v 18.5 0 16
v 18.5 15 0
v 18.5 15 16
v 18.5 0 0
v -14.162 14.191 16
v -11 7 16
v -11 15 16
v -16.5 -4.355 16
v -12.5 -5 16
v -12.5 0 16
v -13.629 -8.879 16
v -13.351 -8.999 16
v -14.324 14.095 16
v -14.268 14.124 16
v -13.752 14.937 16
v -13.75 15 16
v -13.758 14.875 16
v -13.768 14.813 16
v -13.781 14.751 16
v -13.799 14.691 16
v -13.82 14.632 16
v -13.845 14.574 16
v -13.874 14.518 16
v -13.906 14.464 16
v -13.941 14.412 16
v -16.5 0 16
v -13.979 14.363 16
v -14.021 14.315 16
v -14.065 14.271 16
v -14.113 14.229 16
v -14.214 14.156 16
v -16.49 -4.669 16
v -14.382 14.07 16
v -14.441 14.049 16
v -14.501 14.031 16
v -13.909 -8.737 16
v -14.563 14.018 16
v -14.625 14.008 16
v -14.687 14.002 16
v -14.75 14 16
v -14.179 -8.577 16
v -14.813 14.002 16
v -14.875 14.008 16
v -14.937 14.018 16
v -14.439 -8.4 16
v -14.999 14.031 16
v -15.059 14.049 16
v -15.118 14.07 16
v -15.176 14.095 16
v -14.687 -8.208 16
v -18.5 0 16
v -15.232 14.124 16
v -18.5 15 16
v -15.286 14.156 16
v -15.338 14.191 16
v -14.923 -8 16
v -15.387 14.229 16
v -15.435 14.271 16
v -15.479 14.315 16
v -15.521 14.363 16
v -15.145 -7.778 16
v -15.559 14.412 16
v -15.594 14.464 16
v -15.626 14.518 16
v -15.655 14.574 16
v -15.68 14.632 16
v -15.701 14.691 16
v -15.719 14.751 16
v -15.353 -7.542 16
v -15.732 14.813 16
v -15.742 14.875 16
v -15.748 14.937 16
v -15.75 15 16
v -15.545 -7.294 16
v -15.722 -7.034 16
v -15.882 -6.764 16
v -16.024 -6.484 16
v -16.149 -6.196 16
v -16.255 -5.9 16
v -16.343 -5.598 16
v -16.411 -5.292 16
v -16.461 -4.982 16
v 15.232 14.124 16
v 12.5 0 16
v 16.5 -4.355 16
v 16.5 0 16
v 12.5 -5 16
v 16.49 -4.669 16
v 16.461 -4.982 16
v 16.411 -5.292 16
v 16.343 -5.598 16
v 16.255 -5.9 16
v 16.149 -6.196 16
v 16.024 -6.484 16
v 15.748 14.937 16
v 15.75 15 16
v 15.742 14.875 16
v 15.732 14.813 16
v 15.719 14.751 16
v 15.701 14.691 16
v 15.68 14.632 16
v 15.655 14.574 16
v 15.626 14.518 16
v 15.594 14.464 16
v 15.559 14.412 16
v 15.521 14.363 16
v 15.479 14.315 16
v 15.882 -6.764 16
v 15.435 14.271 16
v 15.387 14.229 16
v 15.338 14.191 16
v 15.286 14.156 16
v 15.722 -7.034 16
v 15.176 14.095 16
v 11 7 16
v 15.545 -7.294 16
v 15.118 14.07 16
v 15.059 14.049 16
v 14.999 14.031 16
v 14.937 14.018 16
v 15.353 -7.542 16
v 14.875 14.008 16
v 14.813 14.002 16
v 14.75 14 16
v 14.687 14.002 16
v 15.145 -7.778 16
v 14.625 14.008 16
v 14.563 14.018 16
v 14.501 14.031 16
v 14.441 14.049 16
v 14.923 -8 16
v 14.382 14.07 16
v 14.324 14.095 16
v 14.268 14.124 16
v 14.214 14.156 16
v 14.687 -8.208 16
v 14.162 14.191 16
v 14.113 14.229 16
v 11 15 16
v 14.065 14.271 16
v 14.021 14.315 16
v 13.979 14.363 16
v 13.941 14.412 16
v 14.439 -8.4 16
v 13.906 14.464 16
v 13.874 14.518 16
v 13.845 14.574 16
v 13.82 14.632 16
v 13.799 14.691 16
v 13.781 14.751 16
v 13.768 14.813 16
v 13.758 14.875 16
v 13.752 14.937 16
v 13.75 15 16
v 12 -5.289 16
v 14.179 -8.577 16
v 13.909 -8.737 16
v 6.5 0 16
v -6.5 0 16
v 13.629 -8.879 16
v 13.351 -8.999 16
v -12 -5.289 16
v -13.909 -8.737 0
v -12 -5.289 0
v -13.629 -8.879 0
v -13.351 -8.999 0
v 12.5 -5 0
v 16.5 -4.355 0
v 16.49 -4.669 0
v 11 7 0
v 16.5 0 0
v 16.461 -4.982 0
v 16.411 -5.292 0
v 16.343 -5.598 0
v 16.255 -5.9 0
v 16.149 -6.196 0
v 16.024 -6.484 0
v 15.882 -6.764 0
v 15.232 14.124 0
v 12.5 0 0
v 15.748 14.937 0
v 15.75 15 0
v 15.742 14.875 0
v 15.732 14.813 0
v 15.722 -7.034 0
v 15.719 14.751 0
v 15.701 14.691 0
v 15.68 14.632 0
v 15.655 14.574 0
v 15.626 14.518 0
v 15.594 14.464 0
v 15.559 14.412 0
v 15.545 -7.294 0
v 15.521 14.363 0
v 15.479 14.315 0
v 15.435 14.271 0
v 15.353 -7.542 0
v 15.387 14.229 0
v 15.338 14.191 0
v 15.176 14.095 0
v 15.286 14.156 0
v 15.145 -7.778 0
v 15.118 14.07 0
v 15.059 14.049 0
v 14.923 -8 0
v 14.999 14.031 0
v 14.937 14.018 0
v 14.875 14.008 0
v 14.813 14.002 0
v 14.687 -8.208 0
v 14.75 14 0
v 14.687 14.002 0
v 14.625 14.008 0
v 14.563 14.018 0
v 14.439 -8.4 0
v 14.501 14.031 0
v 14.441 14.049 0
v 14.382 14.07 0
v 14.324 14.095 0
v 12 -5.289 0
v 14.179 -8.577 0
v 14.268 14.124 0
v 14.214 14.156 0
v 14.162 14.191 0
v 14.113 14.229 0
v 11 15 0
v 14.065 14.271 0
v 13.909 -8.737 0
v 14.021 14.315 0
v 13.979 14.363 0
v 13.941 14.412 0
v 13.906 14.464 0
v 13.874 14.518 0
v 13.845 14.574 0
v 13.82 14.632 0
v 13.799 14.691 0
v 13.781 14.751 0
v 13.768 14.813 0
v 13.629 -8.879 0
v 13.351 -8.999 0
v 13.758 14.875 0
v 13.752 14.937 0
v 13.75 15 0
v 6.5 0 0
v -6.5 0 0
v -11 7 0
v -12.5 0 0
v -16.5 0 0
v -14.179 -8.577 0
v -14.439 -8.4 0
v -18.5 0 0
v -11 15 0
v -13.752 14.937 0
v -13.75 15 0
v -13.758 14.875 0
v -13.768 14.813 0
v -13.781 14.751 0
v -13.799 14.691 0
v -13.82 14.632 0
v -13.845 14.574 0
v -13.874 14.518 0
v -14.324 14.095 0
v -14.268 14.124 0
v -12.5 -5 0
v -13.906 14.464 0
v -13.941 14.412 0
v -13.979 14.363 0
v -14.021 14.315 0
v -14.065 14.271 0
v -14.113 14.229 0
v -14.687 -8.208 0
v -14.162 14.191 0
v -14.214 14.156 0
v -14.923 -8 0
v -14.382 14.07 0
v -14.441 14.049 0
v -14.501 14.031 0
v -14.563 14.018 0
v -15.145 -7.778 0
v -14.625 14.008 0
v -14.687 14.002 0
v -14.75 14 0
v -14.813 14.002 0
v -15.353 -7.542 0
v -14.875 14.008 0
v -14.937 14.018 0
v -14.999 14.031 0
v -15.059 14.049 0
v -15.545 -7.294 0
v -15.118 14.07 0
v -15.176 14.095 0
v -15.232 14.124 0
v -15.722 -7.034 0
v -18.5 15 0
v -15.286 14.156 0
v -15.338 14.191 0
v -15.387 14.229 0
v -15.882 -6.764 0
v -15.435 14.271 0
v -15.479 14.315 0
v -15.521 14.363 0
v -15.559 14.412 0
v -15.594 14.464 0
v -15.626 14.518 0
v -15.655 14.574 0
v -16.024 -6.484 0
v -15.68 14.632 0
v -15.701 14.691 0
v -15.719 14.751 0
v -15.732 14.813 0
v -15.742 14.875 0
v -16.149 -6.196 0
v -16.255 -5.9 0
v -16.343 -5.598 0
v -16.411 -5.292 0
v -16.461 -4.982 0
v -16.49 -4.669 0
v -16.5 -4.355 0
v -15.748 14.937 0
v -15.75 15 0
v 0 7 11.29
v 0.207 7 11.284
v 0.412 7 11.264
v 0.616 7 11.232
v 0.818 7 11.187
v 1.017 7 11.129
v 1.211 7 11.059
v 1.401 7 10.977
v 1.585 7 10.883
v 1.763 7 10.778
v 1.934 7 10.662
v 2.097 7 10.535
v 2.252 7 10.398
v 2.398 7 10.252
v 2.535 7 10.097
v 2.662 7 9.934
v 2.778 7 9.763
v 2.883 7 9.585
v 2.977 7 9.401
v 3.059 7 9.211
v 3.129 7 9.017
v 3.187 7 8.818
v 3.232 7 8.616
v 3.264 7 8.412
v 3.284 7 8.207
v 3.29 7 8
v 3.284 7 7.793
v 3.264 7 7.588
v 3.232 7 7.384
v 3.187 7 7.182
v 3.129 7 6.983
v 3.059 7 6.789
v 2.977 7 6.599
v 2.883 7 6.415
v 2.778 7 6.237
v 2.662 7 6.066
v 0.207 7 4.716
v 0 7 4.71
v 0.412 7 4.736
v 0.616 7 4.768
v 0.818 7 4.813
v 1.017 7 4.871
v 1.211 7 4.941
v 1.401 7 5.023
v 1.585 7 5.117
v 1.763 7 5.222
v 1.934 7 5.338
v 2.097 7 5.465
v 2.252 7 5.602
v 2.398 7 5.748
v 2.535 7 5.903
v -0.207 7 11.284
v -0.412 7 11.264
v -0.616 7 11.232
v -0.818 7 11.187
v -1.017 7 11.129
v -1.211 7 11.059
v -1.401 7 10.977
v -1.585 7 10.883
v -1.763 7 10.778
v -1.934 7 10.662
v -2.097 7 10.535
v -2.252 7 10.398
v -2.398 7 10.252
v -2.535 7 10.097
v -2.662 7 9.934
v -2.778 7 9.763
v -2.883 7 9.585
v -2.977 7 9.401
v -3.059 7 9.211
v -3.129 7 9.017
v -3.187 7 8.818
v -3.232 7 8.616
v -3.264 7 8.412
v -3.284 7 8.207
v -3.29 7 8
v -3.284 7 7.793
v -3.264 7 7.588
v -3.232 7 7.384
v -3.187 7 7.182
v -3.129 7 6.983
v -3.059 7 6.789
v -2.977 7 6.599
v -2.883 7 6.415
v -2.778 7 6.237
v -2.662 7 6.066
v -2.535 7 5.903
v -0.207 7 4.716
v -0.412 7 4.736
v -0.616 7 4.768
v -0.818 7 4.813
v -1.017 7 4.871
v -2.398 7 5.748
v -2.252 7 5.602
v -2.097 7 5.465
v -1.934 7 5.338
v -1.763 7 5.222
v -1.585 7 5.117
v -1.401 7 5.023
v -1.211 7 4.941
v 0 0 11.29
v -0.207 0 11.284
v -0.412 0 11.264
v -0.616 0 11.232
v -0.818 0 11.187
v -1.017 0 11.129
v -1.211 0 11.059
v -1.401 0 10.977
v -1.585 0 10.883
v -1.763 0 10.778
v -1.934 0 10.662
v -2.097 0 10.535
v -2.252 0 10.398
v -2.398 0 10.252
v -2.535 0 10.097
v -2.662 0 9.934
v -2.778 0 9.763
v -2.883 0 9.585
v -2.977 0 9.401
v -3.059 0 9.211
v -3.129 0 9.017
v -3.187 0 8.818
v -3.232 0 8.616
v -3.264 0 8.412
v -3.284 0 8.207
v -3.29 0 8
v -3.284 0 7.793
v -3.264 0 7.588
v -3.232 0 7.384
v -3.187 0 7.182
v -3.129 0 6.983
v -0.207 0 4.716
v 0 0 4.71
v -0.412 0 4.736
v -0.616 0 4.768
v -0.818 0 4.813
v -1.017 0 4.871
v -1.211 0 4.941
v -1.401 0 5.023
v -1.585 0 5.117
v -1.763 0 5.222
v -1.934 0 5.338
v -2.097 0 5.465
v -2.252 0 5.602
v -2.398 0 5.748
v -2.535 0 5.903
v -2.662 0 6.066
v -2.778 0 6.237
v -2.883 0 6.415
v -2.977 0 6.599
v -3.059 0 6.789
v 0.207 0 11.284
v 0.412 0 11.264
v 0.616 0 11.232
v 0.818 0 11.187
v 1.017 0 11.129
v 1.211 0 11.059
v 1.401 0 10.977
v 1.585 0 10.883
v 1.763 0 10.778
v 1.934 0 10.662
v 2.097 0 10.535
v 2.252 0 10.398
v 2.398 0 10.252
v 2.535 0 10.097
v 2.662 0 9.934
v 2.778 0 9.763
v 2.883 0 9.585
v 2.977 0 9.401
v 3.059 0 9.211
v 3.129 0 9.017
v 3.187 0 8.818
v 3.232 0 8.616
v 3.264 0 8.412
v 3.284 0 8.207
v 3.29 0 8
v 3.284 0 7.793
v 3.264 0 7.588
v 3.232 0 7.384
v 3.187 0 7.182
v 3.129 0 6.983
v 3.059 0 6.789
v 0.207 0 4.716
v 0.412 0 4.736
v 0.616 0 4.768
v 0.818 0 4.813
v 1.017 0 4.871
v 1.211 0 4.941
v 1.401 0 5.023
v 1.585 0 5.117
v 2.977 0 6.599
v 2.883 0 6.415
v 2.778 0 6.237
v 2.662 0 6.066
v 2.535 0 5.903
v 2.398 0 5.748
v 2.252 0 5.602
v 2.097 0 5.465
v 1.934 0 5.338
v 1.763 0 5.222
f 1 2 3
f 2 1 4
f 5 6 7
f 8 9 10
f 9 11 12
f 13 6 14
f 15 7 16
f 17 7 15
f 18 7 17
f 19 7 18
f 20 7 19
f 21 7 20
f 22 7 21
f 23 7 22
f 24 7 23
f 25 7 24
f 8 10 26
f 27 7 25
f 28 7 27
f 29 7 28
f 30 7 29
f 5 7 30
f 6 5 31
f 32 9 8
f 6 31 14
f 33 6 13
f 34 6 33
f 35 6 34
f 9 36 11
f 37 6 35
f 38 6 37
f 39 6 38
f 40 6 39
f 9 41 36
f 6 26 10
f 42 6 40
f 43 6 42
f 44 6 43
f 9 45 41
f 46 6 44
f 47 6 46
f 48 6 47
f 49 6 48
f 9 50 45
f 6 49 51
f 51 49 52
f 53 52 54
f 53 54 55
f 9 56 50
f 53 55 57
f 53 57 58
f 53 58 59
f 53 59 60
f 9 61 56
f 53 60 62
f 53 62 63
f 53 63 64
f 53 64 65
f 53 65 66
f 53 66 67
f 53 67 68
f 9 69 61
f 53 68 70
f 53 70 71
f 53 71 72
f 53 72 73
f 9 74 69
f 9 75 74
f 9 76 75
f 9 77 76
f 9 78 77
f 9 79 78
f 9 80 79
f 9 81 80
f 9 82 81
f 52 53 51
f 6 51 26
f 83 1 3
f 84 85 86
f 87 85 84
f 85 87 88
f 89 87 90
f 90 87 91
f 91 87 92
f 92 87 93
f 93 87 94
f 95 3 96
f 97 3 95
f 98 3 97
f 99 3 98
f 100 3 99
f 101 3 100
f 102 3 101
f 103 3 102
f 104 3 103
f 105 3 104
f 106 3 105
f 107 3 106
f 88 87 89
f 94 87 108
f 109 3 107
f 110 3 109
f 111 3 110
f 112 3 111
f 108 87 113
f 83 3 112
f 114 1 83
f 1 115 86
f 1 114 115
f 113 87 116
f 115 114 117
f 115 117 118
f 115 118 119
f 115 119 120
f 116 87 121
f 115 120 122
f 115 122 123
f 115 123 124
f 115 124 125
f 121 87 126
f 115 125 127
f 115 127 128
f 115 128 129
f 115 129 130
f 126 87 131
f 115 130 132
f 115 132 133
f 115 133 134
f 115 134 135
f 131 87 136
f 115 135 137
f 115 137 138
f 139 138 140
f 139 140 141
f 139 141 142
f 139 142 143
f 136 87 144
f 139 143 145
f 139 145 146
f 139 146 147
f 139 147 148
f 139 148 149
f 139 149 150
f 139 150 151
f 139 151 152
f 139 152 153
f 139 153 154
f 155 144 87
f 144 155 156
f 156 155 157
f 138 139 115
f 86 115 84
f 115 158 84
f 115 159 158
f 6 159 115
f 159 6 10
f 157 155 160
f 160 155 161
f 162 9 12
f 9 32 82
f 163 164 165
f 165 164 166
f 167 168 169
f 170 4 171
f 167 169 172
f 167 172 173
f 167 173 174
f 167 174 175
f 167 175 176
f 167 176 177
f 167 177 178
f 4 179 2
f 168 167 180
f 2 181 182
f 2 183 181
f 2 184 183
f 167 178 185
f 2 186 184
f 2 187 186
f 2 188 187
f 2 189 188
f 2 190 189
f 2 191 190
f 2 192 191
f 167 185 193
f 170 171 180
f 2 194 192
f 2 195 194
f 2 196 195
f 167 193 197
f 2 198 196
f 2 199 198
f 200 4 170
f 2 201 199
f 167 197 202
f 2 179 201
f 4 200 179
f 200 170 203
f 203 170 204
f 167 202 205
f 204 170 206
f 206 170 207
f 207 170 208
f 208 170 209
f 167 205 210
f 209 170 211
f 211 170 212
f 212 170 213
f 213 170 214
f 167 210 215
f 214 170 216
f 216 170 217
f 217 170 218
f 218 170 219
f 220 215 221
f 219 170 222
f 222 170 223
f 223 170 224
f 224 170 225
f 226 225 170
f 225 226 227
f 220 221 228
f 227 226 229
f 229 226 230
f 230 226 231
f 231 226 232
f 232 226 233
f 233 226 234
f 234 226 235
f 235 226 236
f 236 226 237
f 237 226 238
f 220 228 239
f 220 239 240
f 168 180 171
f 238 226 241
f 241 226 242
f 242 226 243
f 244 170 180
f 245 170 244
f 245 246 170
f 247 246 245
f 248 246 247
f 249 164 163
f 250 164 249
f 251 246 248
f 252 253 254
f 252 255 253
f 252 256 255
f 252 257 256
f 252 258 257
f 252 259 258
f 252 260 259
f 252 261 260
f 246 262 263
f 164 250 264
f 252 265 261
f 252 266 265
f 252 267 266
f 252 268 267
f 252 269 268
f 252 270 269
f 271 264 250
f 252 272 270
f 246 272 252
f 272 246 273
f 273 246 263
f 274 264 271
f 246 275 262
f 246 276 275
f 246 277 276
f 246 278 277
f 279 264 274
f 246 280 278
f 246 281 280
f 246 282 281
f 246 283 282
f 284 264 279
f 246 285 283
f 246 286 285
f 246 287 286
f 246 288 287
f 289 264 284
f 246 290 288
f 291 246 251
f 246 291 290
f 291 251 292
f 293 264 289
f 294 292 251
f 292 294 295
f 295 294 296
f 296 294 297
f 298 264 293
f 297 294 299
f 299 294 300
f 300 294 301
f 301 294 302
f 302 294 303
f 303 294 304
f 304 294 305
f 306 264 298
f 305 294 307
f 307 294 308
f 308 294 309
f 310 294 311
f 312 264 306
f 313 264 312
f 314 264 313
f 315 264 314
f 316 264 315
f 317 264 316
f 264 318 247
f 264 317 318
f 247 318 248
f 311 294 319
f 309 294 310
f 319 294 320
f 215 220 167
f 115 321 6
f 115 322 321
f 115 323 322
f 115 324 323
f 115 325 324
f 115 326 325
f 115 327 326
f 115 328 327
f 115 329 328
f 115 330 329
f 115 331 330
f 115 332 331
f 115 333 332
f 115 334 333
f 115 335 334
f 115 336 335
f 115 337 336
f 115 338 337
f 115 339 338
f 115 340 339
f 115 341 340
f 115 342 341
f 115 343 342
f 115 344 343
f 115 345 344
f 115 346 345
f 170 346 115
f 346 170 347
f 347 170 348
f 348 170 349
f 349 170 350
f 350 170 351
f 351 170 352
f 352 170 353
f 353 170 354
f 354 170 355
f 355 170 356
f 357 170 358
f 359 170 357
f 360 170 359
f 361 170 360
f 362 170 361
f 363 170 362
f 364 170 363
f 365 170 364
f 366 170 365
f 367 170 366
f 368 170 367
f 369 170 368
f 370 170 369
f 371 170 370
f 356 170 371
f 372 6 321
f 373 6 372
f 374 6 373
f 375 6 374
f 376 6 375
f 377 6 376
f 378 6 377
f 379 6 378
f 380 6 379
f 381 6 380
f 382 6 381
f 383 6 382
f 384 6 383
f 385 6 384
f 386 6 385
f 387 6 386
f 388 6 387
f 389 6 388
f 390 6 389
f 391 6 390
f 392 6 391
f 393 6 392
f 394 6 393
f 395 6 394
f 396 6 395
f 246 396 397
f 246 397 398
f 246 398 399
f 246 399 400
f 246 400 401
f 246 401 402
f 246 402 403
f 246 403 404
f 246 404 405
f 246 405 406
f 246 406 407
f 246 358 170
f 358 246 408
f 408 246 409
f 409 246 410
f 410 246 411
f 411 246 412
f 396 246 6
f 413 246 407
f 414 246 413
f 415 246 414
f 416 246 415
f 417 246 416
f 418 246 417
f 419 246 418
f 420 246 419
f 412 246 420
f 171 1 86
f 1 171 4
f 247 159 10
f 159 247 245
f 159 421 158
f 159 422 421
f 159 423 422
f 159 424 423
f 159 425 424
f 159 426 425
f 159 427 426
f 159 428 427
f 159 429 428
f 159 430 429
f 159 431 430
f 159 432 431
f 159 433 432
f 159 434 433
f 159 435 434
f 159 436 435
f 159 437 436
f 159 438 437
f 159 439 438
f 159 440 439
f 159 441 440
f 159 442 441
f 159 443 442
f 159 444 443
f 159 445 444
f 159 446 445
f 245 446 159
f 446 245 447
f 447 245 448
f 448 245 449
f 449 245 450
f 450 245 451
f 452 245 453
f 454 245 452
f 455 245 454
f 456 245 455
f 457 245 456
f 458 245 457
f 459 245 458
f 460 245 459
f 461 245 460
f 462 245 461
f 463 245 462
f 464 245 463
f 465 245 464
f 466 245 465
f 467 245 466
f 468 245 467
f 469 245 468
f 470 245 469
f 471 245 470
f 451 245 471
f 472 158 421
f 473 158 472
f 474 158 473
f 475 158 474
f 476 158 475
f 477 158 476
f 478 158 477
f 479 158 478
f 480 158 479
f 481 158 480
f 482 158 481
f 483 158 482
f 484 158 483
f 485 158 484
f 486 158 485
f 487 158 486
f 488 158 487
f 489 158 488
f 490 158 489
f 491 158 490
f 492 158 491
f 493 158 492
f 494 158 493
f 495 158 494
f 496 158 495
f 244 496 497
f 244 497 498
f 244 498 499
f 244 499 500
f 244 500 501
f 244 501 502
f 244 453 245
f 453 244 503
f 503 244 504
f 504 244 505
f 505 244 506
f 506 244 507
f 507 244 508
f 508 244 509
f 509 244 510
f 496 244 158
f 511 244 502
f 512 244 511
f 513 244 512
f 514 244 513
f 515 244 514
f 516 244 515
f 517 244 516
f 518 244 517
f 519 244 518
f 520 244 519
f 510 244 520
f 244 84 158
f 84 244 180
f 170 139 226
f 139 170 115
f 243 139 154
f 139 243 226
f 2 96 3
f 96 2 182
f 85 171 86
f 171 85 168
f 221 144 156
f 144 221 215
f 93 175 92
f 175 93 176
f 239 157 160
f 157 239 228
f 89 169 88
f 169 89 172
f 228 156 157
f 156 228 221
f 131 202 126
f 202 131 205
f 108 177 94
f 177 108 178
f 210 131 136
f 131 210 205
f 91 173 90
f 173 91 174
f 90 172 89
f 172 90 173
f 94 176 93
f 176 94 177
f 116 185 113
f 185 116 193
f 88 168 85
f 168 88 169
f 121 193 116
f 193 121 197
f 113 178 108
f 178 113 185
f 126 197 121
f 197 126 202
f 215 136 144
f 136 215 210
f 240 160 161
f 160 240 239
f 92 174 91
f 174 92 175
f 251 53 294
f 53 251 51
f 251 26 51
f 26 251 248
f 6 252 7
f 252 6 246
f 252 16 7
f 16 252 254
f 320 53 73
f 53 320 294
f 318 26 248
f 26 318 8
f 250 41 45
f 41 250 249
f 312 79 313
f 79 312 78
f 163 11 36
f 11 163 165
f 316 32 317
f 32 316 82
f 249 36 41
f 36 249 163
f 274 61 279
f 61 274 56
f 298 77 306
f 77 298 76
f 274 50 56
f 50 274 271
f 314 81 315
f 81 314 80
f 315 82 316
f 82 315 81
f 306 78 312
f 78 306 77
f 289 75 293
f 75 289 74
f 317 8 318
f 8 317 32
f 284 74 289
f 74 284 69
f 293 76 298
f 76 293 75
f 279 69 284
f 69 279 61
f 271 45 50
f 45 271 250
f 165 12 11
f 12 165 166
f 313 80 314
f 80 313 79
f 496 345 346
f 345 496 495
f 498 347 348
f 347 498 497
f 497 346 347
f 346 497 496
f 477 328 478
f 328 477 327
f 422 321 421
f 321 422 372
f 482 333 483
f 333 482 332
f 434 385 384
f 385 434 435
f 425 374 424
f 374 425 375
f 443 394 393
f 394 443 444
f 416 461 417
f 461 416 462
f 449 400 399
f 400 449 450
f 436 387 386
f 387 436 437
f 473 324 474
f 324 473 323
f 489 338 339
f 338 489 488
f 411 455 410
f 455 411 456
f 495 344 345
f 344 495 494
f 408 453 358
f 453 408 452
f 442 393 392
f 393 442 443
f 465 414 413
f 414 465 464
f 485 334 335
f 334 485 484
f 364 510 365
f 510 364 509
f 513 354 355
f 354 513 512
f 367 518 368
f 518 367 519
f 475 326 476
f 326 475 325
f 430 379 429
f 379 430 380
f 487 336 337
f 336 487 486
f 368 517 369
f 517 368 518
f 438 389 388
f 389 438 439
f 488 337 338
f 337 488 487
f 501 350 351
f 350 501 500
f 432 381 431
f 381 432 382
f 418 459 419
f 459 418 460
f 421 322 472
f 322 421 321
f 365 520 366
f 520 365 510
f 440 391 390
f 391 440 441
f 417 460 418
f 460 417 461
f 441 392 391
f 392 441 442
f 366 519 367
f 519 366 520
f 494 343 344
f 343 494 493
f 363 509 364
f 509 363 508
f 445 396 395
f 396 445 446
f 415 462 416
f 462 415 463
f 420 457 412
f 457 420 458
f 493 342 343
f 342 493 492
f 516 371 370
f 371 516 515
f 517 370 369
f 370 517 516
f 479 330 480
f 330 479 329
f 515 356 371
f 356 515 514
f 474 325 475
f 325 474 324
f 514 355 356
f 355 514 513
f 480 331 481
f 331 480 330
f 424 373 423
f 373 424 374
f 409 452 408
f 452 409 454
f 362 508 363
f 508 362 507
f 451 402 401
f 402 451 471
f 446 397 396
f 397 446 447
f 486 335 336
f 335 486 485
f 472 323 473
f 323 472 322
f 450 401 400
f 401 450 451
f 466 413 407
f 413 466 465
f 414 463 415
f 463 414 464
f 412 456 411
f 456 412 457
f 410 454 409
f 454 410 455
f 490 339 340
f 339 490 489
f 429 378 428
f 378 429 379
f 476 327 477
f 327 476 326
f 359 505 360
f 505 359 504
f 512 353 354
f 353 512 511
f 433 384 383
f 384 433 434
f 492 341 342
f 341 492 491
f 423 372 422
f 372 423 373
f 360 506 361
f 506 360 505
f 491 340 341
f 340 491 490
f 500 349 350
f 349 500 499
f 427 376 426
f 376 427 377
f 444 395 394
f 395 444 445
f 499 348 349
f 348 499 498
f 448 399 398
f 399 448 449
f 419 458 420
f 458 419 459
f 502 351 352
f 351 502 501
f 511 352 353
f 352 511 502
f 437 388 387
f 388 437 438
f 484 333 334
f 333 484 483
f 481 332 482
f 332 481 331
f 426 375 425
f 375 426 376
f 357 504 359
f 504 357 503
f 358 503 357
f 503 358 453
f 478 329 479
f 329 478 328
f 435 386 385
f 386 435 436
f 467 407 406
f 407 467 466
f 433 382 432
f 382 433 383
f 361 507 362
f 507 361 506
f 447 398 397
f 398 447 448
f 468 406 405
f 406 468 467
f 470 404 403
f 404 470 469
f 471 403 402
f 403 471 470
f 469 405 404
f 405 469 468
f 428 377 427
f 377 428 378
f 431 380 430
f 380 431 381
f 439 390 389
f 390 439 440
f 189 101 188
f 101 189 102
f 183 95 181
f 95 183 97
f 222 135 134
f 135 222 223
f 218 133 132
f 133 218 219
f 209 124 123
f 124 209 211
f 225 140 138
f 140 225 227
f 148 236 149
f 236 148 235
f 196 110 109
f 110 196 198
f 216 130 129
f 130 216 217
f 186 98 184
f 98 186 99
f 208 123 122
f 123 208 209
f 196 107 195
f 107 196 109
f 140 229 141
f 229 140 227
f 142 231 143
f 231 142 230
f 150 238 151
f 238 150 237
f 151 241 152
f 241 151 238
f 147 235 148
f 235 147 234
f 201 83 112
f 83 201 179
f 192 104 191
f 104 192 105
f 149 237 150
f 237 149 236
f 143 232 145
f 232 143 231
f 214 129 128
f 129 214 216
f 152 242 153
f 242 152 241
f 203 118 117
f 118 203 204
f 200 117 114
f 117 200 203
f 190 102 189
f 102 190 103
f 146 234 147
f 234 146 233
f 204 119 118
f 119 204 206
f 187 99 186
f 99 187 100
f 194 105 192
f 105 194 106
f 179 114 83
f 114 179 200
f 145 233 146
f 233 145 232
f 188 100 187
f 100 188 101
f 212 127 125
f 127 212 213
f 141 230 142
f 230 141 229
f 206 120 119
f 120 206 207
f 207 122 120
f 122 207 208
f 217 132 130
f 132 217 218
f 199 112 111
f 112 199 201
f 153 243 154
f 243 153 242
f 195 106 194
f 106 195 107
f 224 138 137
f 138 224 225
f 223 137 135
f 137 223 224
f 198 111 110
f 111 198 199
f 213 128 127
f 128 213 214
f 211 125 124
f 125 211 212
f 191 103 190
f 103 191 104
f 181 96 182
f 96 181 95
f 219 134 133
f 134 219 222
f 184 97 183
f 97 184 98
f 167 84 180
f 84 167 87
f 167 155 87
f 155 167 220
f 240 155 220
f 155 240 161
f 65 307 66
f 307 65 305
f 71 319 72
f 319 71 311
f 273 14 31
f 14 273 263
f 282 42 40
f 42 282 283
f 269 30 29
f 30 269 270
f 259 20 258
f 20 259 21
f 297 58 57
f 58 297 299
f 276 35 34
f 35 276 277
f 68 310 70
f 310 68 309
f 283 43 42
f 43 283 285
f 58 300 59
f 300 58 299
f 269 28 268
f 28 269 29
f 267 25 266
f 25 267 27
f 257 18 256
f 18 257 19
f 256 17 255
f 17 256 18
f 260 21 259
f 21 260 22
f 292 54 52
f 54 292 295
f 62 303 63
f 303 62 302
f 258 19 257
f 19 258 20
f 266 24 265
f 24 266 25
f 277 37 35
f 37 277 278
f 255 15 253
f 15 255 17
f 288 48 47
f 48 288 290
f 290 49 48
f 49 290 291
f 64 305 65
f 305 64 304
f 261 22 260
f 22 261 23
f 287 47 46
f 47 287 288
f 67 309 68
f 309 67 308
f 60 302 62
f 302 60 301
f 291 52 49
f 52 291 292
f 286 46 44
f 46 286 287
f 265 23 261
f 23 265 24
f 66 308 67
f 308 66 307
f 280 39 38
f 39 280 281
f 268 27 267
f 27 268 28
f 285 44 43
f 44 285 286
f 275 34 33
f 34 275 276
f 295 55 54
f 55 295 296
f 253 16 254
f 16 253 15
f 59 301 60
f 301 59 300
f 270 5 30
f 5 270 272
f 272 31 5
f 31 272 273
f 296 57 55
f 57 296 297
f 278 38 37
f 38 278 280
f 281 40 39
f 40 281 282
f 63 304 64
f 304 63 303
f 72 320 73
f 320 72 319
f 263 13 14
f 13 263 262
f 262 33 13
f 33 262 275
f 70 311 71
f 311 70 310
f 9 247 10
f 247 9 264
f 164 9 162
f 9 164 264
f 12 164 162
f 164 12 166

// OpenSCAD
// Created from Code_Ybelt_holderA.stl
// https://github.com/Mecan0/Code
// By J.Rodigo (www.jra.so)
// Licence Creative commons atribution & share alike.

// Media Pieza
module mpieza(){
	cube([18.5, 7, 16]);

	translate([11, 0, 0])
	cube([7.5, 15, 16]);

	translate([12.5, -4.355, 0])
	cube([4, 4.355, 16]);

	translate([11.5, -4.355, 0])
	rotate( 90, [0, 0, 1])
	cylinder(h = 16, r = 5, $fn=100);
}

// Operaciones para media pieza
module moperaciones(){
	translate([0, -1, 8])
	rotate( -90, [1, 0, 0])
	cylinder(h = 9, r = 3.29, $fn=100);
	
	translate([14.75, 15, -1])
	rotate( 90, [0, 0, 1])
	cylinder(h = 18, r = 1, $fn=100);

	translate([6.5, -5, -1])
	cube([6, 5, 18]);

	translate([12.5, -5, -1])
	rotate( 120, [0, 0, 1])
	cube([4, 6, 18]);

	translate([12, -5.288, -1])
	rotate( 200, [0, 0, 1])
	cube([5, 4, 18]);
}

// Generamos la pieza y las operaciones
difference () {
	union() {
		mpieza();

		mirror([ 1, 0, 0 ])
		mpieza();
	}	
	union() {
		moperaciones();

		mirror([ 1, 0, 0 ])
		moperaciones();
	}	
}
